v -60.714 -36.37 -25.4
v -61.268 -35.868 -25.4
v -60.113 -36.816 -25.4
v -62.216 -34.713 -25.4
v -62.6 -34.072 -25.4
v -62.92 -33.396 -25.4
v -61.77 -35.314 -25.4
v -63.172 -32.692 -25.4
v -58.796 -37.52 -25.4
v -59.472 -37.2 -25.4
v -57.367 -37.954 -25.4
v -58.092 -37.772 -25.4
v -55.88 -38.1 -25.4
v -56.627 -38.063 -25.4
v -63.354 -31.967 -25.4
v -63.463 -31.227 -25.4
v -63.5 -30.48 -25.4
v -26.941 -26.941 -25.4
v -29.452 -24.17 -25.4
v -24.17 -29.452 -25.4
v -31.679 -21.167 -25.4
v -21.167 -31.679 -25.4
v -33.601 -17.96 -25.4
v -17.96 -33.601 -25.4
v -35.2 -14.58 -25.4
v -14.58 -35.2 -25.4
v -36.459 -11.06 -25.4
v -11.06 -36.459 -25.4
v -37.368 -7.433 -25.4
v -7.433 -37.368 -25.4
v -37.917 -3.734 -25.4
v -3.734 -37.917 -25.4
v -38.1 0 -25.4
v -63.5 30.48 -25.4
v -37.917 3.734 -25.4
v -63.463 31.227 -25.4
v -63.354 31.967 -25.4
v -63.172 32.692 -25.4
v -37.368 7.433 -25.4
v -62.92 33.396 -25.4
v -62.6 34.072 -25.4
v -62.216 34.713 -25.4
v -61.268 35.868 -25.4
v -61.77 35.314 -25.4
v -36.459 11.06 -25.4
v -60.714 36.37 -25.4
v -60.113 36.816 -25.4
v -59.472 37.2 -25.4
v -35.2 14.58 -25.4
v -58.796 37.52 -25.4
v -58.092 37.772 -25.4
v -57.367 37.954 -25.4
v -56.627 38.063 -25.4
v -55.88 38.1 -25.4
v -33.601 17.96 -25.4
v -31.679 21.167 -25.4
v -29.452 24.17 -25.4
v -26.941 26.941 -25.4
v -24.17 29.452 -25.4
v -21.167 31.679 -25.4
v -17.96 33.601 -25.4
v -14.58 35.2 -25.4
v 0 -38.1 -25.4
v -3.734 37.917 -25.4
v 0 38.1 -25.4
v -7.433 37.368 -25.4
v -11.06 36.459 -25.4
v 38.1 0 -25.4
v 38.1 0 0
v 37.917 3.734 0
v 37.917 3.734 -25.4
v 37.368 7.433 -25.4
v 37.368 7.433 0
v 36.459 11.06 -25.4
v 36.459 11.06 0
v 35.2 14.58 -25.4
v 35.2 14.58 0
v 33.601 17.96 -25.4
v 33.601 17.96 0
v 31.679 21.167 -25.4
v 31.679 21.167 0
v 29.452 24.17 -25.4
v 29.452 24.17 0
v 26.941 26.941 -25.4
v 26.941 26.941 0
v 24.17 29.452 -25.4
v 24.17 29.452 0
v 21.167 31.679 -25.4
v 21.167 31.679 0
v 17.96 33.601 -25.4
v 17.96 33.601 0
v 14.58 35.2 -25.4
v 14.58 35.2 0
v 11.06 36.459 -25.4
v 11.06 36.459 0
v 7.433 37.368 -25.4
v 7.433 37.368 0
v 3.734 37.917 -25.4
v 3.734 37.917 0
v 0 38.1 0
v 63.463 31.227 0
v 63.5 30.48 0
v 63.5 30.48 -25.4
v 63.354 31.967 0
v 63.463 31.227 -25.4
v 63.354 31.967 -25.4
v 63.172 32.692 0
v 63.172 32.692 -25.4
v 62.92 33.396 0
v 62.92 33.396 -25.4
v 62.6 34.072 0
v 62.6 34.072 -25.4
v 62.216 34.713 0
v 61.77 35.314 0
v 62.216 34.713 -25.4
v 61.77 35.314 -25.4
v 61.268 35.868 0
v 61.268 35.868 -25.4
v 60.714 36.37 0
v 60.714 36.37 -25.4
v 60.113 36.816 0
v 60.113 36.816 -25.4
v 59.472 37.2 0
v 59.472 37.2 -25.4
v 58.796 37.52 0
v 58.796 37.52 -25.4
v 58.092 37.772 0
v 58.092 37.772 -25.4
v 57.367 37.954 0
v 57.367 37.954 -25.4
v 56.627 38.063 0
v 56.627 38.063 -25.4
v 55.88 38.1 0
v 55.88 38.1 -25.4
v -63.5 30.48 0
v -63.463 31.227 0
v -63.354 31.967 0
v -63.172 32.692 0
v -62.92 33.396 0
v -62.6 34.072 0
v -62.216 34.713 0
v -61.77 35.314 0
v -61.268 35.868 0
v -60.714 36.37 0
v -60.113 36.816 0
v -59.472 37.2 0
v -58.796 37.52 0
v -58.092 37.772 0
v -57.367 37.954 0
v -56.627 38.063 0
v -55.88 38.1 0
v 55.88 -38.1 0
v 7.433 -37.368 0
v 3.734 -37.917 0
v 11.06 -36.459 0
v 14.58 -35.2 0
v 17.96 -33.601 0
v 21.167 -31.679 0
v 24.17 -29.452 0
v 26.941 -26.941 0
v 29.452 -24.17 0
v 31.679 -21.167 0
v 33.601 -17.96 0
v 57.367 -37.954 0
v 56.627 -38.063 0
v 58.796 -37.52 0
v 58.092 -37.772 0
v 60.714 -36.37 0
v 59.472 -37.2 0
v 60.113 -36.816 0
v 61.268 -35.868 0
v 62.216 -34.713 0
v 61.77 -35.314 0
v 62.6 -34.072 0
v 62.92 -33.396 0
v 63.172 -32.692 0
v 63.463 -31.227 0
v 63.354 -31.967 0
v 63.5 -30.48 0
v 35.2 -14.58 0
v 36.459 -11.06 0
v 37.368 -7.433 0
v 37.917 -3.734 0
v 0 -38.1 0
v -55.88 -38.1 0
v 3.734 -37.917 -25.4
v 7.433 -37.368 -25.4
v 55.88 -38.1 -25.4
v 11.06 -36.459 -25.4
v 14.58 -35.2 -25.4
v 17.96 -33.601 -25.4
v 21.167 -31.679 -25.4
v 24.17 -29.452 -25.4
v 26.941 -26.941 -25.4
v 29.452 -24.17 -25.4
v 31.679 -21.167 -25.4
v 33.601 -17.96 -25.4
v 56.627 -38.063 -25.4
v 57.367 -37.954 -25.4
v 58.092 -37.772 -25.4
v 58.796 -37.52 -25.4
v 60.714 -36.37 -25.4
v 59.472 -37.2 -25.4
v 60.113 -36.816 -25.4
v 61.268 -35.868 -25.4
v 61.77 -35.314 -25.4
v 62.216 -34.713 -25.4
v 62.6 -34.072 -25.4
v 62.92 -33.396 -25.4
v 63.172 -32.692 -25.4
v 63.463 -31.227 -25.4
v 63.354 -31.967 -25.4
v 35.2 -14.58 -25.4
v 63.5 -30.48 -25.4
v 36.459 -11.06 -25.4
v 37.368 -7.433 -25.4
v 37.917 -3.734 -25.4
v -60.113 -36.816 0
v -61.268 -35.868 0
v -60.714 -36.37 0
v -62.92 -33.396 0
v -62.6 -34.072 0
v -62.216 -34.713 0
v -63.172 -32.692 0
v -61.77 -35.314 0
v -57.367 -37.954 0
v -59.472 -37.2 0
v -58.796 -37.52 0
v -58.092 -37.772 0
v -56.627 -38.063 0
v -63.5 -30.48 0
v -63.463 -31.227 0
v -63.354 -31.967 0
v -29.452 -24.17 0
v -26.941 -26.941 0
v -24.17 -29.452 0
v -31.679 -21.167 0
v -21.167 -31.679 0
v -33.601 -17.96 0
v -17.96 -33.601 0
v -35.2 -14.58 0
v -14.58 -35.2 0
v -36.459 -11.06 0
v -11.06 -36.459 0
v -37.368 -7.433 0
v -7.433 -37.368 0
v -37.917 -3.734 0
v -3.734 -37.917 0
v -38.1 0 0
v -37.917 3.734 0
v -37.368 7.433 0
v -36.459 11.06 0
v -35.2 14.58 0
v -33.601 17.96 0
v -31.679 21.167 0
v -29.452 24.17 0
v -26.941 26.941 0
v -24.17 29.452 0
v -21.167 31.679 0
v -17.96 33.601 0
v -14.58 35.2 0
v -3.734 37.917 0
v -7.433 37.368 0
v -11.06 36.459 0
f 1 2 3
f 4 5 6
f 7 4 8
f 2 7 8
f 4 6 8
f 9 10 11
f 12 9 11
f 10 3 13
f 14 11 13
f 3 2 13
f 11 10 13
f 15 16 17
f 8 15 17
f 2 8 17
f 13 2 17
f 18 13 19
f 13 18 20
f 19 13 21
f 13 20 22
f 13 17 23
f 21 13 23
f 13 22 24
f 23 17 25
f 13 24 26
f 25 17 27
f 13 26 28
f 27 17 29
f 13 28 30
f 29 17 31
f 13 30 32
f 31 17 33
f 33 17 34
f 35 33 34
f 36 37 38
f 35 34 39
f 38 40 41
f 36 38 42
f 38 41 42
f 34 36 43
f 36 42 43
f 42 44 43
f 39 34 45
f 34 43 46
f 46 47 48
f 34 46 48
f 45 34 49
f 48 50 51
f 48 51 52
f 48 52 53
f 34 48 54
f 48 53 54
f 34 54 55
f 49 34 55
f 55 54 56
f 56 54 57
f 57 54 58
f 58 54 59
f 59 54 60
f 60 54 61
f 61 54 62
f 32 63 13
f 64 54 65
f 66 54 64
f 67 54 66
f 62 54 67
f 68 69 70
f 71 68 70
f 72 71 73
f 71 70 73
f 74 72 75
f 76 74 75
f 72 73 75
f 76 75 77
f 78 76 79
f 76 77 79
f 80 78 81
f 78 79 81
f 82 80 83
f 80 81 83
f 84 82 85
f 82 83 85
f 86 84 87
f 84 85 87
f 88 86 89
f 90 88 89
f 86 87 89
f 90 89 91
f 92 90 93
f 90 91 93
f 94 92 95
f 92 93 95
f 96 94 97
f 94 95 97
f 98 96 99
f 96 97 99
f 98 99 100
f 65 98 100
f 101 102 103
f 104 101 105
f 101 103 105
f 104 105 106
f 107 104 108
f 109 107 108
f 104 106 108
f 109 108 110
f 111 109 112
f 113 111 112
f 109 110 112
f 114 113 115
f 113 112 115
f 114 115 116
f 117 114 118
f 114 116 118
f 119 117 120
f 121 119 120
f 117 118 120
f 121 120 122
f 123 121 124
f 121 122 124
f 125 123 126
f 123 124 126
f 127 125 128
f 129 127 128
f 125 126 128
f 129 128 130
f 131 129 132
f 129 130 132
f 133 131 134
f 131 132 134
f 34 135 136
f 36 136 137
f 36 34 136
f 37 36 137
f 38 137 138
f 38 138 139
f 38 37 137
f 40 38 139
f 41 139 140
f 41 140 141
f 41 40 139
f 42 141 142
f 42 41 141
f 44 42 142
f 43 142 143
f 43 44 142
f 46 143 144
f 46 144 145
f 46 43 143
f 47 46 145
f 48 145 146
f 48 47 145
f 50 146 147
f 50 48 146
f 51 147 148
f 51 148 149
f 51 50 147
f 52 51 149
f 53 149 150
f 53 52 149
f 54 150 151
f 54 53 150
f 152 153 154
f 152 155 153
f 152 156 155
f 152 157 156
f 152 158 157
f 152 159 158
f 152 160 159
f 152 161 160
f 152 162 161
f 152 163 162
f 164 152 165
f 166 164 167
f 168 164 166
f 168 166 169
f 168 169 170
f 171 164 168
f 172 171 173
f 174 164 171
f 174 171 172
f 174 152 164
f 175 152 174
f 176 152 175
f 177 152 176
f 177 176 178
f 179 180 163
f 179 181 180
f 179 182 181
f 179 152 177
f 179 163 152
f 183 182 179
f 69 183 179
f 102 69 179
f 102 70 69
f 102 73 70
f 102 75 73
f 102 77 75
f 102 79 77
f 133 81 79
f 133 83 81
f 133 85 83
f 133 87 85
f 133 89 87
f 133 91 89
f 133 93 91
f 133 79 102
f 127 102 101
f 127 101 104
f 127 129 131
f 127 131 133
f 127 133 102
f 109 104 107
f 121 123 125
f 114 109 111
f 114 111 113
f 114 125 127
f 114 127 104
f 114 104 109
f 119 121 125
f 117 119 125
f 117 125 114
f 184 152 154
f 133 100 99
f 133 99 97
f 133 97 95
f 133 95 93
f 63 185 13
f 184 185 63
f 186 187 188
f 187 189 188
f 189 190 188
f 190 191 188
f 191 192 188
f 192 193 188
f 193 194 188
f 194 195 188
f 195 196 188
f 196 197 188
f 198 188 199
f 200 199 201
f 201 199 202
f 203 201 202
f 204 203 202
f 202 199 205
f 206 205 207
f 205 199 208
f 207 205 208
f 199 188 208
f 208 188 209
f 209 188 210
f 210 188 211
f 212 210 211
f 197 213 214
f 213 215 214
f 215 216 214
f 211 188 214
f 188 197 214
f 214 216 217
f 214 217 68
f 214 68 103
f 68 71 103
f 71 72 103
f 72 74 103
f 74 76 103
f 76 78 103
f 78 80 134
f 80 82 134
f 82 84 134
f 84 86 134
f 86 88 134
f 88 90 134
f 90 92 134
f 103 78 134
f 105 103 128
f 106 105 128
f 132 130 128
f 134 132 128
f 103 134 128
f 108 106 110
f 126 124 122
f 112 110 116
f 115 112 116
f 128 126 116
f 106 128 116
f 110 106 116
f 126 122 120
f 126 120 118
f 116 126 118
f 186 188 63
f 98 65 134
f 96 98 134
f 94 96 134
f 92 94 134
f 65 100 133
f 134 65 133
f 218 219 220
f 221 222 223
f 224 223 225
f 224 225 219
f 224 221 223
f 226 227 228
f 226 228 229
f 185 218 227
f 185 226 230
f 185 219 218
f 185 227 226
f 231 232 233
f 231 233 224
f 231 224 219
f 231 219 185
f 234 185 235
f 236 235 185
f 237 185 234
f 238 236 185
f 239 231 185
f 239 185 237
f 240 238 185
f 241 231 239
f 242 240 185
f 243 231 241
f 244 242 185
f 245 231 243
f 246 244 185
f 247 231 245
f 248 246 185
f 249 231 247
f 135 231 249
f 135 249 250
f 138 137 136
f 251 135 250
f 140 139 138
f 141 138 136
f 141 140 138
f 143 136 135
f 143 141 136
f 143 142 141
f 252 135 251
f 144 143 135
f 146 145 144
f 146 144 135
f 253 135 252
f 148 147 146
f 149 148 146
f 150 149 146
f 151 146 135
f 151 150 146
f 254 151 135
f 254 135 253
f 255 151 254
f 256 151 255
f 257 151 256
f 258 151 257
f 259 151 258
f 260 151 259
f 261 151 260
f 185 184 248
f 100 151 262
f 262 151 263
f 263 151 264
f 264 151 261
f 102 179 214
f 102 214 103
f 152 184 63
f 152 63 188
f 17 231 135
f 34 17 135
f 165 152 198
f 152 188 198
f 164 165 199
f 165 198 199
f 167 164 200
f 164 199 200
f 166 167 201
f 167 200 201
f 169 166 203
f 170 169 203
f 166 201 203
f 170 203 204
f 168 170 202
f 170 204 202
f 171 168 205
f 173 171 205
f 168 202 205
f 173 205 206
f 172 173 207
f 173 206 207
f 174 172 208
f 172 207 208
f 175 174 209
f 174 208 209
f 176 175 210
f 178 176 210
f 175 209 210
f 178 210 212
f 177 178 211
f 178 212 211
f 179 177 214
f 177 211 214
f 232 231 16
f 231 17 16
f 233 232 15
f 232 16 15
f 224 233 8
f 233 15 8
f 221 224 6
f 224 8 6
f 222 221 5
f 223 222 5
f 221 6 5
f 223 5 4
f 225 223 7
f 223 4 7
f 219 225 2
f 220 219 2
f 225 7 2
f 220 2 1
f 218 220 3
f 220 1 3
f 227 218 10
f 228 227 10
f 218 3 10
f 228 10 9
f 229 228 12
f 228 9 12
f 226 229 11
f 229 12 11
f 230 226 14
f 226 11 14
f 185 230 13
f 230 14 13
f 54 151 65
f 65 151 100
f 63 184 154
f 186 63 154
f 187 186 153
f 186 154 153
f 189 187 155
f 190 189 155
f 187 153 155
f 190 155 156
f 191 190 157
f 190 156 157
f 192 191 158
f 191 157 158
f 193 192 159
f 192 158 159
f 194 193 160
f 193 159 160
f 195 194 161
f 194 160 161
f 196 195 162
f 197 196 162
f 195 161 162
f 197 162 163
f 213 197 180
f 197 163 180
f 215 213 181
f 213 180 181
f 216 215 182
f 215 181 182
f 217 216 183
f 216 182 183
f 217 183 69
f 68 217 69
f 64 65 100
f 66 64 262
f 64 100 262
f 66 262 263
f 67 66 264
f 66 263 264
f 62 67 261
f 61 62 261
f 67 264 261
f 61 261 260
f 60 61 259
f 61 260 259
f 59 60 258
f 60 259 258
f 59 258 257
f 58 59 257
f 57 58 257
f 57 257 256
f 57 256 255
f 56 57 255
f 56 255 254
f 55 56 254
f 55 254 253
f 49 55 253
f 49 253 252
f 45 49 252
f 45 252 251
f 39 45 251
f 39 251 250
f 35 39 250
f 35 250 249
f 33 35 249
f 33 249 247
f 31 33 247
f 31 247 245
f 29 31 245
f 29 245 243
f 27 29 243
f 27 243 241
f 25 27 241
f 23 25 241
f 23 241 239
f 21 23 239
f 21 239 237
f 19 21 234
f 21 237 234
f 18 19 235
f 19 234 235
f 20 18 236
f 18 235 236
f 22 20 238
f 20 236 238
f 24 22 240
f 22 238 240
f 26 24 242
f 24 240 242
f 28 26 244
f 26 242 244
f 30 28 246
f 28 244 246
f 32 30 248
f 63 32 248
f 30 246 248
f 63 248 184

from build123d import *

# Parameters (mm, degrees)
F0_W     = 127
F0_H     = 76.2
F1_DEPTH = 25.4
F2_R     = 7.62
F4_DEPTH = 76.2


with BuildPart() as f1:
    # F0 (on Top) → F1 (new body)
    with BuildSketch(Plane.XY):
        Rectangle(F0_W, F0_H)
    extrude(amount=-F1_DEPTH)

    # F2
    f2_edges = [f1.edges().sort_by_distance(p)[0] for p in [
        (63.5, -38.1, -12.7),
        (63.5, 38.1, -12.7),
        (-63.5, -38.1, -12.7),
        (-63.5, 38.1, -12.7),
    ]]
    fillet(f2_edges, radius=F2_R)

    # F3 (on face) → F4 (cut)
    with BuildSketch(Plane.XY):
        with BuildLine():
            ThreePointArc((0, -38.1), (26.940768, -26.940768), (38.1, 0))
            ThreePointArc((38.1, 0), (26.940768, 26.940768), (0, 38.1))
            ThreePointArc((0, 38.1), (-38.1, 0), (0, -38.1))
        make_face()
    extrude(amount=-F4_DEPTH, mode=Mode.SUBTRACT)


solid = f1.part
